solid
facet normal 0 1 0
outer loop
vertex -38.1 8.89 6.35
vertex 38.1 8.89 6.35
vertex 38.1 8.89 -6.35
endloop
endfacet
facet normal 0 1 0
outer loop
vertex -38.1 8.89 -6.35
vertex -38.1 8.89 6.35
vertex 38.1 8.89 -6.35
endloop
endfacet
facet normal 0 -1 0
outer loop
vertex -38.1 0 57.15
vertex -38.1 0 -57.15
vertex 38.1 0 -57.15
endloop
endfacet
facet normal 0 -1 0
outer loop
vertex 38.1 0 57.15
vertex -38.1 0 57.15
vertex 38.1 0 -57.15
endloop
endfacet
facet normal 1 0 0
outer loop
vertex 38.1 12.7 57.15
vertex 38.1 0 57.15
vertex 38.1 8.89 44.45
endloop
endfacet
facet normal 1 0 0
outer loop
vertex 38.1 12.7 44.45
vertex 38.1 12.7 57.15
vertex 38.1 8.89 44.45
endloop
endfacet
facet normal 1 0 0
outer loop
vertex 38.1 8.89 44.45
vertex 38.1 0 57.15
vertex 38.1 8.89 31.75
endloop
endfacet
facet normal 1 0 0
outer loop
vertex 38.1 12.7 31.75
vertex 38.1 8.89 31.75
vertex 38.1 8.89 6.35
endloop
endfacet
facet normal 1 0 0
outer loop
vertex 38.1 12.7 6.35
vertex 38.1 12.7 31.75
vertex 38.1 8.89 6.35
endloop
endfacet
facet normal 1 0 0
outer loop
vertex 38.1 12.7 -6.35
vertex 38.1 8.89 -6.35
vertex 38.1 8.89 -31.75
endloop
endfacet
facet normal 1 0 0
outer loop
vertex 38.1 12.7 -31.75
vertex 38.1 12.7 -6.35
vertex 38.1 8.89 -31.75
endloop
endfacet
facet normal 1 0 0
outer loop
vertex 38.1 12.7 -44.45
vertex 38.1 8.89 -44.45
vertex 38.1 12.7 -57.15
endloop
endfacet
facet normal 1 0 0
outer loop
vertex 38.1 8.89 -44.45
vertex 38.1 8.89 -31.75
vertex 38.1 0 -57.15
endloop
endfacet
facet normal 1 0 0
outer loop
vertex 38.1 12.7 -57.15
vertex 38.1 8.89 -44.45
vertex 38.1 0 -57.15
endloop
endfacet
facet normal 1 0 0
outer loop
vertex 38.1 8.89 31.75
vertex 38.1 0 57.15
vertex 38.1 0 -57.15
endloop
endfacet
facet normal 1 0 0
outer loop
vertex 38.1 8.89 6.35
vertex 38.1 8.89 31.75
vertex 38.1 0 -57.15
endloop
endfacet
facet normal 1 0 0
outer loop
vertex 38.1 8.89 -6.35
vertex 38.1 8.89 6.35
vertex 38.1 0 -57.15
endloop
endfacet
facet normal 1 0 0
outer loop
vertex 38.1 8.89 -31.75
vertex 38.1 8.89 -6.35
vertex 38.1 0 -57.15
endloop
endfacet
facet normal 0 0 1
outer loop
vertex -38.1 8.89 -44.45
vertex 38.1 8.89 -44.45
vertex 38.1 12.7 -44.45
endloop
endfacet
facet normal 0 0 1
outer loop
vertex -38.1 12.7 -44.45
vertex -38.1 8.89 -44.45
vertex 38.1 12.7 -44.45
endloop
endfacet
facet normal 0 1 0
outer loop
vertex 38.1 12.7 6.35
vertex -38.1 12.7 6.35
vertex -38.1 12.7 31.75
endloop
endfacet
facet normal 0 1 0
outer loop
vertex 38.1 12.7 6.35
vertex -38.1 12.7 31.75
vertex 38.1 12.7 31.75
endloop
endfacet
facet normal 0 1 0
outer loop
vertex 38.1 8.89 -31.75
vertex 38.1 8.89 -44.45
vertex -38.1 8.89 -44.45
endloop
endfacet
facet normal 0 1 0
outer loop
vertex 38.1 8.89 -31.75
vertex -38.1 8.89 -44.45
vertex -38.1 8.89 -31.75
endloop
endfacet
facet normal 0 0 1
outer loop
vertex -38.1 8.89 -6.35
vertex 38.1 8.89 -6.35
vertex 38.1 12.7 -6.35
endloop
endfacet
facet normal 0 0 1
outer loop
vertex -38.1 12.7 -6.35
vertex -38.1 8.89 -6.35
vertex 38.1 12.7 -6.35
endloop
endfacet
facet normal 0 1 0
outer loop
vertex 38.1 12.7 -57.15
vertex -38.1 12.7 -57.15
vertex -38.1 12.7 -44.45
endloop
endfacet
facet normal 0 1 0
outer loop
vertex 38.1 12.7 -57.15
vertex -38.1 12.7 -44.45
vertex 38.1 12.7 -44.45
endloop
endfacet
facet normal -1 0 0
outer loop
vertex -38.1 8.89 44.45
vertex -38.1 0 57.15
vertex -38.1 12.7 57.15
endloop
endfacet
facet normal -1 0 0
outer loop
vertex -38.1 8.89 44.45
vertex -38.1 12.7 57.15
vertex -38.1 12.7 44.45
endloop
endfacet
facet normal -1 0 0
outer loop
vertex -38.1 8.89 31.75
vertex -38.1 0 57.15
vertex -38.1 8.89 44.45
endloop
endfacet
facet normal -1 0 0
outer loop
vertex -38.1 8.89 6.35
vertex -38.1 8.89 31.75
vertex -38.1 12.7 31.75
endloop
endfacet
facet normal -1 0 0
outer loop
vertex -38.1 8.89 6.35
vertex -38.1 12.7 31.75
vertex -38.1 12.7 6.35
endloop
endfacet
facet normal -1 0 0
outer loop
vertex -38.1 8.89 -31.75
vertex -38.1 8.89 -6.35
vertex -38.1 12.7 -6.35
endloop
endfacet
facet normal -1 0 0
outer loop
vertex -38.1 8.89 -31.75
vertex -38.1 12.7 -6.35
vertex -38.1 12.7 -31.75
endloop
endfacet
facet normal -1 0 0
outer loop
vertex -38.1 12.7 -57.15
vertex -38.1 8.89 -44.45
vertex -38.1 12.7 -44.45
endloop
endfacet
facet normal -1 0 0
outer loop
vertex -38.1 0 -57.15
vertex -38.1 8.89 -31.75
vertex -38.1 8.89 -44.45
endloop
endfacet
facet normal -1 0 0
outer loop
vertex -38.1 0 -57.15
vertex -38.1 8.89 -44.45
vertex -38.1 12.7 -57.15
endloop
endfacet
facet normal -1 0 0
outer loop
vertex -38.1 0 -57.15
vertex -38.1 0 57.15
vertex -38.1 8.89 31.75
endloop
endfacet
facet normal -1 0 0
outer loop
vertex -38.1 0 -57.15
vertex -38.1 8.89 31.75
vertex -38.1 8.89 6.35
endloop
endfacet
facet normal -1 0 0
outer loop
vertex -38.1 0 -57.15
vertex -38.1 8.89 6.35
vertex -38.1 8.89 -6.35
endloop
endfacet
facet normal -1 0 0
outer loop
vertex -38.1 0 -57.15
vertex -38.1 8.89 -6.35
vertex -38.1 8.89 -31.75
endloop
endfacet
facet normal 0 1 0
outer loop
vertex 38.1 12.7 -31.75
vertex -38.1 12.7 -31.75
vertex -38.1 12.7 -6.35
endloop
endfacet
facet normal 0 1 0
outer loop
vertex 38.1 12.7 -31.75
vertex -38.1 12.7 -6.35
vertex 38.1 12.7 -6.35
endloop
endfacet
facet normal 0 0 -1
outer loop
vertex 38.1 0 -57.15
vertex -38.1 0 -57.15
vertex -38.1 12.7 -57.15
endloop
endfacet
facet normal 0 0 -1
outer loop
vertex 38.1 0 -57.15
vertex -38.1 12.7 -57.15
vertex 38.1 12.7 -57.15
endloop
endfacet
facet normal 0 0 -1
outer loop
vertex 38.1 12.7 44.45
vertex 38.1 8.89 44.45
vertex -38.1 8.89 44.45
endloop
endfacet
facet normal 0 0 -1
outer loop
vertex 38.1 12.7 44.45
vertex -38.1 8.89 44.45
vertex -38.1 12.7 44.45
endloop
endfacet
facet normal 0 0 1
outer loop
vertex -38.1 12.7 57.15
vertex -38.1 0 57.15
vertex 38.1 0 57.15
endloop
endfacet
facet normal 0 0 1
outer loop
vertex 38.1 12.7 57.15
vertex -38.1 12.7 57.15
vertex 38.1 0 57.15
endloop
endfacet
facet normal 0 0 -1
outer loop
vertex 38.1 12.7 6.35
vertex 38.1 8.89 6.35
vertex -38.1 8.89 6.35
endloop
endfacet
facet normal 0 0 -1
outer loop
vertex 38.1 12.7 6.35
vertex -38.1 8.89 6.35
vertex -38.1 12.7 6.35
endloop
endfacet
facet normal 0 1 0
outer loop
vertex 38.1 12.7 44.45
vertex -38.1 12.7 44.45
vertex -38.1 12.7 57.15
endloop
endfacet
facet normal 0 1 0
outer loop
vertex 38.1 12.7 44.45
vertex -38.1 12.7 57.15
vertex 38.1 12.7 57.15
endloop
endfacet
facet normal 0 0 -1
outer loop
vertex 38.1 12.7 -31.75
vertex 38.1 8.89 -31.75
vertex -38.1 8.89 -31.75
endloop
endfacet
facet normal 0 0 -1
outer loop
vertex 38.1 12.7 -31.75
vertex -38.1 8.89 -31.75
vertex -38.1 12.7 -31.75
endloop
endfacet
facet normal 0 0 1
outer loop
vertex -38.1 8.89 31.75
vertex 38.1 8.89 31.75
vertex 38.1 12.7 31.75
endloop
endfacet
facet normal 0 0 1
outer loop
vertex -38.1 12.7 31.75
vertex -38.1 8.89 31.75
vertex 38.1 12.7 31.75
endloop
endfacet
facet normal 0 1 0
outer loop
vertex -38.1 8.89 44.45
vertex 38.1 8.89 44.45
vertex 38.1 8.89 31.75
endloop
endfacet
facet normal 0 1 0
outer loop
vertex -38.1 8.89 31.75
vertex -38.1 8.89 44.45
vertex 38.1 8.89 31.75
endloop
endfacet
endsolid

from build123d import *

# Parameters (mm, degrees)
SKETCH2_W           = 76.2
SKETCH2_H           = 114.3
BOSS_EXTRUDE1_DEPTH = 12.7
SKETCH4_W           = 12.7
SKETCH4_H           = 3.81
CUT_EXTRUDE1_DEPTH  = 76.2
SKETCH5_W           = 12.7
SKETCH5_H           = 3.81
CUT_EXTRUDE2_DEPTH  = 76.2


with BuildPart() as part:
    # Sketch2 → Boss-Extrude1 (new body)
    with BuildSketch(Plane(origin=(0, 0, 0), x_dir=(1, 0, 0), z_dir=(0, 1, 0))):
        Rectangle(SKETCH2_W, SKETCH2_H)
    extrude(amount=BOSS_EXTRUDE1_DEPTH)

    # Sketch4 → Cut-Extrude1 (cut)
    with BuildSketch(Plane(origin=(38.1, 0, 0), x_dir=(0, 0, -1), z_dir=(1, 0, 0))):
        with Locations((-38.1, 10.795)):
            Rectangle(SKETCH4_W, SKETCH4_H)
    cut_extrude1 = extrude(amount=-CUT_EXTRUDE1_DEPTH, mode=Mode.SUBTRACT)

    # Mirror1: Cut-Extrude1 across plane
    add(cut_extrude1.mirror(Plane.XY), mode=Mode.SUBTRACT)

    # Sketch5 → Cut-Extrude2 (cut)
    with BuildSketch(Plane(origin=(38.1, 0, 0), x_dir=(0, 0, -1), z_dir=(1, 0, 0))):
        with Locations((0, 10.795)):
            Rectangle(SKETCH5_W, SKETCH5_H)
    extrude(amount=-CUT_EXTRUDE2_DEPTH, mode=Mode.SUBTRACT)


solid = part.part
